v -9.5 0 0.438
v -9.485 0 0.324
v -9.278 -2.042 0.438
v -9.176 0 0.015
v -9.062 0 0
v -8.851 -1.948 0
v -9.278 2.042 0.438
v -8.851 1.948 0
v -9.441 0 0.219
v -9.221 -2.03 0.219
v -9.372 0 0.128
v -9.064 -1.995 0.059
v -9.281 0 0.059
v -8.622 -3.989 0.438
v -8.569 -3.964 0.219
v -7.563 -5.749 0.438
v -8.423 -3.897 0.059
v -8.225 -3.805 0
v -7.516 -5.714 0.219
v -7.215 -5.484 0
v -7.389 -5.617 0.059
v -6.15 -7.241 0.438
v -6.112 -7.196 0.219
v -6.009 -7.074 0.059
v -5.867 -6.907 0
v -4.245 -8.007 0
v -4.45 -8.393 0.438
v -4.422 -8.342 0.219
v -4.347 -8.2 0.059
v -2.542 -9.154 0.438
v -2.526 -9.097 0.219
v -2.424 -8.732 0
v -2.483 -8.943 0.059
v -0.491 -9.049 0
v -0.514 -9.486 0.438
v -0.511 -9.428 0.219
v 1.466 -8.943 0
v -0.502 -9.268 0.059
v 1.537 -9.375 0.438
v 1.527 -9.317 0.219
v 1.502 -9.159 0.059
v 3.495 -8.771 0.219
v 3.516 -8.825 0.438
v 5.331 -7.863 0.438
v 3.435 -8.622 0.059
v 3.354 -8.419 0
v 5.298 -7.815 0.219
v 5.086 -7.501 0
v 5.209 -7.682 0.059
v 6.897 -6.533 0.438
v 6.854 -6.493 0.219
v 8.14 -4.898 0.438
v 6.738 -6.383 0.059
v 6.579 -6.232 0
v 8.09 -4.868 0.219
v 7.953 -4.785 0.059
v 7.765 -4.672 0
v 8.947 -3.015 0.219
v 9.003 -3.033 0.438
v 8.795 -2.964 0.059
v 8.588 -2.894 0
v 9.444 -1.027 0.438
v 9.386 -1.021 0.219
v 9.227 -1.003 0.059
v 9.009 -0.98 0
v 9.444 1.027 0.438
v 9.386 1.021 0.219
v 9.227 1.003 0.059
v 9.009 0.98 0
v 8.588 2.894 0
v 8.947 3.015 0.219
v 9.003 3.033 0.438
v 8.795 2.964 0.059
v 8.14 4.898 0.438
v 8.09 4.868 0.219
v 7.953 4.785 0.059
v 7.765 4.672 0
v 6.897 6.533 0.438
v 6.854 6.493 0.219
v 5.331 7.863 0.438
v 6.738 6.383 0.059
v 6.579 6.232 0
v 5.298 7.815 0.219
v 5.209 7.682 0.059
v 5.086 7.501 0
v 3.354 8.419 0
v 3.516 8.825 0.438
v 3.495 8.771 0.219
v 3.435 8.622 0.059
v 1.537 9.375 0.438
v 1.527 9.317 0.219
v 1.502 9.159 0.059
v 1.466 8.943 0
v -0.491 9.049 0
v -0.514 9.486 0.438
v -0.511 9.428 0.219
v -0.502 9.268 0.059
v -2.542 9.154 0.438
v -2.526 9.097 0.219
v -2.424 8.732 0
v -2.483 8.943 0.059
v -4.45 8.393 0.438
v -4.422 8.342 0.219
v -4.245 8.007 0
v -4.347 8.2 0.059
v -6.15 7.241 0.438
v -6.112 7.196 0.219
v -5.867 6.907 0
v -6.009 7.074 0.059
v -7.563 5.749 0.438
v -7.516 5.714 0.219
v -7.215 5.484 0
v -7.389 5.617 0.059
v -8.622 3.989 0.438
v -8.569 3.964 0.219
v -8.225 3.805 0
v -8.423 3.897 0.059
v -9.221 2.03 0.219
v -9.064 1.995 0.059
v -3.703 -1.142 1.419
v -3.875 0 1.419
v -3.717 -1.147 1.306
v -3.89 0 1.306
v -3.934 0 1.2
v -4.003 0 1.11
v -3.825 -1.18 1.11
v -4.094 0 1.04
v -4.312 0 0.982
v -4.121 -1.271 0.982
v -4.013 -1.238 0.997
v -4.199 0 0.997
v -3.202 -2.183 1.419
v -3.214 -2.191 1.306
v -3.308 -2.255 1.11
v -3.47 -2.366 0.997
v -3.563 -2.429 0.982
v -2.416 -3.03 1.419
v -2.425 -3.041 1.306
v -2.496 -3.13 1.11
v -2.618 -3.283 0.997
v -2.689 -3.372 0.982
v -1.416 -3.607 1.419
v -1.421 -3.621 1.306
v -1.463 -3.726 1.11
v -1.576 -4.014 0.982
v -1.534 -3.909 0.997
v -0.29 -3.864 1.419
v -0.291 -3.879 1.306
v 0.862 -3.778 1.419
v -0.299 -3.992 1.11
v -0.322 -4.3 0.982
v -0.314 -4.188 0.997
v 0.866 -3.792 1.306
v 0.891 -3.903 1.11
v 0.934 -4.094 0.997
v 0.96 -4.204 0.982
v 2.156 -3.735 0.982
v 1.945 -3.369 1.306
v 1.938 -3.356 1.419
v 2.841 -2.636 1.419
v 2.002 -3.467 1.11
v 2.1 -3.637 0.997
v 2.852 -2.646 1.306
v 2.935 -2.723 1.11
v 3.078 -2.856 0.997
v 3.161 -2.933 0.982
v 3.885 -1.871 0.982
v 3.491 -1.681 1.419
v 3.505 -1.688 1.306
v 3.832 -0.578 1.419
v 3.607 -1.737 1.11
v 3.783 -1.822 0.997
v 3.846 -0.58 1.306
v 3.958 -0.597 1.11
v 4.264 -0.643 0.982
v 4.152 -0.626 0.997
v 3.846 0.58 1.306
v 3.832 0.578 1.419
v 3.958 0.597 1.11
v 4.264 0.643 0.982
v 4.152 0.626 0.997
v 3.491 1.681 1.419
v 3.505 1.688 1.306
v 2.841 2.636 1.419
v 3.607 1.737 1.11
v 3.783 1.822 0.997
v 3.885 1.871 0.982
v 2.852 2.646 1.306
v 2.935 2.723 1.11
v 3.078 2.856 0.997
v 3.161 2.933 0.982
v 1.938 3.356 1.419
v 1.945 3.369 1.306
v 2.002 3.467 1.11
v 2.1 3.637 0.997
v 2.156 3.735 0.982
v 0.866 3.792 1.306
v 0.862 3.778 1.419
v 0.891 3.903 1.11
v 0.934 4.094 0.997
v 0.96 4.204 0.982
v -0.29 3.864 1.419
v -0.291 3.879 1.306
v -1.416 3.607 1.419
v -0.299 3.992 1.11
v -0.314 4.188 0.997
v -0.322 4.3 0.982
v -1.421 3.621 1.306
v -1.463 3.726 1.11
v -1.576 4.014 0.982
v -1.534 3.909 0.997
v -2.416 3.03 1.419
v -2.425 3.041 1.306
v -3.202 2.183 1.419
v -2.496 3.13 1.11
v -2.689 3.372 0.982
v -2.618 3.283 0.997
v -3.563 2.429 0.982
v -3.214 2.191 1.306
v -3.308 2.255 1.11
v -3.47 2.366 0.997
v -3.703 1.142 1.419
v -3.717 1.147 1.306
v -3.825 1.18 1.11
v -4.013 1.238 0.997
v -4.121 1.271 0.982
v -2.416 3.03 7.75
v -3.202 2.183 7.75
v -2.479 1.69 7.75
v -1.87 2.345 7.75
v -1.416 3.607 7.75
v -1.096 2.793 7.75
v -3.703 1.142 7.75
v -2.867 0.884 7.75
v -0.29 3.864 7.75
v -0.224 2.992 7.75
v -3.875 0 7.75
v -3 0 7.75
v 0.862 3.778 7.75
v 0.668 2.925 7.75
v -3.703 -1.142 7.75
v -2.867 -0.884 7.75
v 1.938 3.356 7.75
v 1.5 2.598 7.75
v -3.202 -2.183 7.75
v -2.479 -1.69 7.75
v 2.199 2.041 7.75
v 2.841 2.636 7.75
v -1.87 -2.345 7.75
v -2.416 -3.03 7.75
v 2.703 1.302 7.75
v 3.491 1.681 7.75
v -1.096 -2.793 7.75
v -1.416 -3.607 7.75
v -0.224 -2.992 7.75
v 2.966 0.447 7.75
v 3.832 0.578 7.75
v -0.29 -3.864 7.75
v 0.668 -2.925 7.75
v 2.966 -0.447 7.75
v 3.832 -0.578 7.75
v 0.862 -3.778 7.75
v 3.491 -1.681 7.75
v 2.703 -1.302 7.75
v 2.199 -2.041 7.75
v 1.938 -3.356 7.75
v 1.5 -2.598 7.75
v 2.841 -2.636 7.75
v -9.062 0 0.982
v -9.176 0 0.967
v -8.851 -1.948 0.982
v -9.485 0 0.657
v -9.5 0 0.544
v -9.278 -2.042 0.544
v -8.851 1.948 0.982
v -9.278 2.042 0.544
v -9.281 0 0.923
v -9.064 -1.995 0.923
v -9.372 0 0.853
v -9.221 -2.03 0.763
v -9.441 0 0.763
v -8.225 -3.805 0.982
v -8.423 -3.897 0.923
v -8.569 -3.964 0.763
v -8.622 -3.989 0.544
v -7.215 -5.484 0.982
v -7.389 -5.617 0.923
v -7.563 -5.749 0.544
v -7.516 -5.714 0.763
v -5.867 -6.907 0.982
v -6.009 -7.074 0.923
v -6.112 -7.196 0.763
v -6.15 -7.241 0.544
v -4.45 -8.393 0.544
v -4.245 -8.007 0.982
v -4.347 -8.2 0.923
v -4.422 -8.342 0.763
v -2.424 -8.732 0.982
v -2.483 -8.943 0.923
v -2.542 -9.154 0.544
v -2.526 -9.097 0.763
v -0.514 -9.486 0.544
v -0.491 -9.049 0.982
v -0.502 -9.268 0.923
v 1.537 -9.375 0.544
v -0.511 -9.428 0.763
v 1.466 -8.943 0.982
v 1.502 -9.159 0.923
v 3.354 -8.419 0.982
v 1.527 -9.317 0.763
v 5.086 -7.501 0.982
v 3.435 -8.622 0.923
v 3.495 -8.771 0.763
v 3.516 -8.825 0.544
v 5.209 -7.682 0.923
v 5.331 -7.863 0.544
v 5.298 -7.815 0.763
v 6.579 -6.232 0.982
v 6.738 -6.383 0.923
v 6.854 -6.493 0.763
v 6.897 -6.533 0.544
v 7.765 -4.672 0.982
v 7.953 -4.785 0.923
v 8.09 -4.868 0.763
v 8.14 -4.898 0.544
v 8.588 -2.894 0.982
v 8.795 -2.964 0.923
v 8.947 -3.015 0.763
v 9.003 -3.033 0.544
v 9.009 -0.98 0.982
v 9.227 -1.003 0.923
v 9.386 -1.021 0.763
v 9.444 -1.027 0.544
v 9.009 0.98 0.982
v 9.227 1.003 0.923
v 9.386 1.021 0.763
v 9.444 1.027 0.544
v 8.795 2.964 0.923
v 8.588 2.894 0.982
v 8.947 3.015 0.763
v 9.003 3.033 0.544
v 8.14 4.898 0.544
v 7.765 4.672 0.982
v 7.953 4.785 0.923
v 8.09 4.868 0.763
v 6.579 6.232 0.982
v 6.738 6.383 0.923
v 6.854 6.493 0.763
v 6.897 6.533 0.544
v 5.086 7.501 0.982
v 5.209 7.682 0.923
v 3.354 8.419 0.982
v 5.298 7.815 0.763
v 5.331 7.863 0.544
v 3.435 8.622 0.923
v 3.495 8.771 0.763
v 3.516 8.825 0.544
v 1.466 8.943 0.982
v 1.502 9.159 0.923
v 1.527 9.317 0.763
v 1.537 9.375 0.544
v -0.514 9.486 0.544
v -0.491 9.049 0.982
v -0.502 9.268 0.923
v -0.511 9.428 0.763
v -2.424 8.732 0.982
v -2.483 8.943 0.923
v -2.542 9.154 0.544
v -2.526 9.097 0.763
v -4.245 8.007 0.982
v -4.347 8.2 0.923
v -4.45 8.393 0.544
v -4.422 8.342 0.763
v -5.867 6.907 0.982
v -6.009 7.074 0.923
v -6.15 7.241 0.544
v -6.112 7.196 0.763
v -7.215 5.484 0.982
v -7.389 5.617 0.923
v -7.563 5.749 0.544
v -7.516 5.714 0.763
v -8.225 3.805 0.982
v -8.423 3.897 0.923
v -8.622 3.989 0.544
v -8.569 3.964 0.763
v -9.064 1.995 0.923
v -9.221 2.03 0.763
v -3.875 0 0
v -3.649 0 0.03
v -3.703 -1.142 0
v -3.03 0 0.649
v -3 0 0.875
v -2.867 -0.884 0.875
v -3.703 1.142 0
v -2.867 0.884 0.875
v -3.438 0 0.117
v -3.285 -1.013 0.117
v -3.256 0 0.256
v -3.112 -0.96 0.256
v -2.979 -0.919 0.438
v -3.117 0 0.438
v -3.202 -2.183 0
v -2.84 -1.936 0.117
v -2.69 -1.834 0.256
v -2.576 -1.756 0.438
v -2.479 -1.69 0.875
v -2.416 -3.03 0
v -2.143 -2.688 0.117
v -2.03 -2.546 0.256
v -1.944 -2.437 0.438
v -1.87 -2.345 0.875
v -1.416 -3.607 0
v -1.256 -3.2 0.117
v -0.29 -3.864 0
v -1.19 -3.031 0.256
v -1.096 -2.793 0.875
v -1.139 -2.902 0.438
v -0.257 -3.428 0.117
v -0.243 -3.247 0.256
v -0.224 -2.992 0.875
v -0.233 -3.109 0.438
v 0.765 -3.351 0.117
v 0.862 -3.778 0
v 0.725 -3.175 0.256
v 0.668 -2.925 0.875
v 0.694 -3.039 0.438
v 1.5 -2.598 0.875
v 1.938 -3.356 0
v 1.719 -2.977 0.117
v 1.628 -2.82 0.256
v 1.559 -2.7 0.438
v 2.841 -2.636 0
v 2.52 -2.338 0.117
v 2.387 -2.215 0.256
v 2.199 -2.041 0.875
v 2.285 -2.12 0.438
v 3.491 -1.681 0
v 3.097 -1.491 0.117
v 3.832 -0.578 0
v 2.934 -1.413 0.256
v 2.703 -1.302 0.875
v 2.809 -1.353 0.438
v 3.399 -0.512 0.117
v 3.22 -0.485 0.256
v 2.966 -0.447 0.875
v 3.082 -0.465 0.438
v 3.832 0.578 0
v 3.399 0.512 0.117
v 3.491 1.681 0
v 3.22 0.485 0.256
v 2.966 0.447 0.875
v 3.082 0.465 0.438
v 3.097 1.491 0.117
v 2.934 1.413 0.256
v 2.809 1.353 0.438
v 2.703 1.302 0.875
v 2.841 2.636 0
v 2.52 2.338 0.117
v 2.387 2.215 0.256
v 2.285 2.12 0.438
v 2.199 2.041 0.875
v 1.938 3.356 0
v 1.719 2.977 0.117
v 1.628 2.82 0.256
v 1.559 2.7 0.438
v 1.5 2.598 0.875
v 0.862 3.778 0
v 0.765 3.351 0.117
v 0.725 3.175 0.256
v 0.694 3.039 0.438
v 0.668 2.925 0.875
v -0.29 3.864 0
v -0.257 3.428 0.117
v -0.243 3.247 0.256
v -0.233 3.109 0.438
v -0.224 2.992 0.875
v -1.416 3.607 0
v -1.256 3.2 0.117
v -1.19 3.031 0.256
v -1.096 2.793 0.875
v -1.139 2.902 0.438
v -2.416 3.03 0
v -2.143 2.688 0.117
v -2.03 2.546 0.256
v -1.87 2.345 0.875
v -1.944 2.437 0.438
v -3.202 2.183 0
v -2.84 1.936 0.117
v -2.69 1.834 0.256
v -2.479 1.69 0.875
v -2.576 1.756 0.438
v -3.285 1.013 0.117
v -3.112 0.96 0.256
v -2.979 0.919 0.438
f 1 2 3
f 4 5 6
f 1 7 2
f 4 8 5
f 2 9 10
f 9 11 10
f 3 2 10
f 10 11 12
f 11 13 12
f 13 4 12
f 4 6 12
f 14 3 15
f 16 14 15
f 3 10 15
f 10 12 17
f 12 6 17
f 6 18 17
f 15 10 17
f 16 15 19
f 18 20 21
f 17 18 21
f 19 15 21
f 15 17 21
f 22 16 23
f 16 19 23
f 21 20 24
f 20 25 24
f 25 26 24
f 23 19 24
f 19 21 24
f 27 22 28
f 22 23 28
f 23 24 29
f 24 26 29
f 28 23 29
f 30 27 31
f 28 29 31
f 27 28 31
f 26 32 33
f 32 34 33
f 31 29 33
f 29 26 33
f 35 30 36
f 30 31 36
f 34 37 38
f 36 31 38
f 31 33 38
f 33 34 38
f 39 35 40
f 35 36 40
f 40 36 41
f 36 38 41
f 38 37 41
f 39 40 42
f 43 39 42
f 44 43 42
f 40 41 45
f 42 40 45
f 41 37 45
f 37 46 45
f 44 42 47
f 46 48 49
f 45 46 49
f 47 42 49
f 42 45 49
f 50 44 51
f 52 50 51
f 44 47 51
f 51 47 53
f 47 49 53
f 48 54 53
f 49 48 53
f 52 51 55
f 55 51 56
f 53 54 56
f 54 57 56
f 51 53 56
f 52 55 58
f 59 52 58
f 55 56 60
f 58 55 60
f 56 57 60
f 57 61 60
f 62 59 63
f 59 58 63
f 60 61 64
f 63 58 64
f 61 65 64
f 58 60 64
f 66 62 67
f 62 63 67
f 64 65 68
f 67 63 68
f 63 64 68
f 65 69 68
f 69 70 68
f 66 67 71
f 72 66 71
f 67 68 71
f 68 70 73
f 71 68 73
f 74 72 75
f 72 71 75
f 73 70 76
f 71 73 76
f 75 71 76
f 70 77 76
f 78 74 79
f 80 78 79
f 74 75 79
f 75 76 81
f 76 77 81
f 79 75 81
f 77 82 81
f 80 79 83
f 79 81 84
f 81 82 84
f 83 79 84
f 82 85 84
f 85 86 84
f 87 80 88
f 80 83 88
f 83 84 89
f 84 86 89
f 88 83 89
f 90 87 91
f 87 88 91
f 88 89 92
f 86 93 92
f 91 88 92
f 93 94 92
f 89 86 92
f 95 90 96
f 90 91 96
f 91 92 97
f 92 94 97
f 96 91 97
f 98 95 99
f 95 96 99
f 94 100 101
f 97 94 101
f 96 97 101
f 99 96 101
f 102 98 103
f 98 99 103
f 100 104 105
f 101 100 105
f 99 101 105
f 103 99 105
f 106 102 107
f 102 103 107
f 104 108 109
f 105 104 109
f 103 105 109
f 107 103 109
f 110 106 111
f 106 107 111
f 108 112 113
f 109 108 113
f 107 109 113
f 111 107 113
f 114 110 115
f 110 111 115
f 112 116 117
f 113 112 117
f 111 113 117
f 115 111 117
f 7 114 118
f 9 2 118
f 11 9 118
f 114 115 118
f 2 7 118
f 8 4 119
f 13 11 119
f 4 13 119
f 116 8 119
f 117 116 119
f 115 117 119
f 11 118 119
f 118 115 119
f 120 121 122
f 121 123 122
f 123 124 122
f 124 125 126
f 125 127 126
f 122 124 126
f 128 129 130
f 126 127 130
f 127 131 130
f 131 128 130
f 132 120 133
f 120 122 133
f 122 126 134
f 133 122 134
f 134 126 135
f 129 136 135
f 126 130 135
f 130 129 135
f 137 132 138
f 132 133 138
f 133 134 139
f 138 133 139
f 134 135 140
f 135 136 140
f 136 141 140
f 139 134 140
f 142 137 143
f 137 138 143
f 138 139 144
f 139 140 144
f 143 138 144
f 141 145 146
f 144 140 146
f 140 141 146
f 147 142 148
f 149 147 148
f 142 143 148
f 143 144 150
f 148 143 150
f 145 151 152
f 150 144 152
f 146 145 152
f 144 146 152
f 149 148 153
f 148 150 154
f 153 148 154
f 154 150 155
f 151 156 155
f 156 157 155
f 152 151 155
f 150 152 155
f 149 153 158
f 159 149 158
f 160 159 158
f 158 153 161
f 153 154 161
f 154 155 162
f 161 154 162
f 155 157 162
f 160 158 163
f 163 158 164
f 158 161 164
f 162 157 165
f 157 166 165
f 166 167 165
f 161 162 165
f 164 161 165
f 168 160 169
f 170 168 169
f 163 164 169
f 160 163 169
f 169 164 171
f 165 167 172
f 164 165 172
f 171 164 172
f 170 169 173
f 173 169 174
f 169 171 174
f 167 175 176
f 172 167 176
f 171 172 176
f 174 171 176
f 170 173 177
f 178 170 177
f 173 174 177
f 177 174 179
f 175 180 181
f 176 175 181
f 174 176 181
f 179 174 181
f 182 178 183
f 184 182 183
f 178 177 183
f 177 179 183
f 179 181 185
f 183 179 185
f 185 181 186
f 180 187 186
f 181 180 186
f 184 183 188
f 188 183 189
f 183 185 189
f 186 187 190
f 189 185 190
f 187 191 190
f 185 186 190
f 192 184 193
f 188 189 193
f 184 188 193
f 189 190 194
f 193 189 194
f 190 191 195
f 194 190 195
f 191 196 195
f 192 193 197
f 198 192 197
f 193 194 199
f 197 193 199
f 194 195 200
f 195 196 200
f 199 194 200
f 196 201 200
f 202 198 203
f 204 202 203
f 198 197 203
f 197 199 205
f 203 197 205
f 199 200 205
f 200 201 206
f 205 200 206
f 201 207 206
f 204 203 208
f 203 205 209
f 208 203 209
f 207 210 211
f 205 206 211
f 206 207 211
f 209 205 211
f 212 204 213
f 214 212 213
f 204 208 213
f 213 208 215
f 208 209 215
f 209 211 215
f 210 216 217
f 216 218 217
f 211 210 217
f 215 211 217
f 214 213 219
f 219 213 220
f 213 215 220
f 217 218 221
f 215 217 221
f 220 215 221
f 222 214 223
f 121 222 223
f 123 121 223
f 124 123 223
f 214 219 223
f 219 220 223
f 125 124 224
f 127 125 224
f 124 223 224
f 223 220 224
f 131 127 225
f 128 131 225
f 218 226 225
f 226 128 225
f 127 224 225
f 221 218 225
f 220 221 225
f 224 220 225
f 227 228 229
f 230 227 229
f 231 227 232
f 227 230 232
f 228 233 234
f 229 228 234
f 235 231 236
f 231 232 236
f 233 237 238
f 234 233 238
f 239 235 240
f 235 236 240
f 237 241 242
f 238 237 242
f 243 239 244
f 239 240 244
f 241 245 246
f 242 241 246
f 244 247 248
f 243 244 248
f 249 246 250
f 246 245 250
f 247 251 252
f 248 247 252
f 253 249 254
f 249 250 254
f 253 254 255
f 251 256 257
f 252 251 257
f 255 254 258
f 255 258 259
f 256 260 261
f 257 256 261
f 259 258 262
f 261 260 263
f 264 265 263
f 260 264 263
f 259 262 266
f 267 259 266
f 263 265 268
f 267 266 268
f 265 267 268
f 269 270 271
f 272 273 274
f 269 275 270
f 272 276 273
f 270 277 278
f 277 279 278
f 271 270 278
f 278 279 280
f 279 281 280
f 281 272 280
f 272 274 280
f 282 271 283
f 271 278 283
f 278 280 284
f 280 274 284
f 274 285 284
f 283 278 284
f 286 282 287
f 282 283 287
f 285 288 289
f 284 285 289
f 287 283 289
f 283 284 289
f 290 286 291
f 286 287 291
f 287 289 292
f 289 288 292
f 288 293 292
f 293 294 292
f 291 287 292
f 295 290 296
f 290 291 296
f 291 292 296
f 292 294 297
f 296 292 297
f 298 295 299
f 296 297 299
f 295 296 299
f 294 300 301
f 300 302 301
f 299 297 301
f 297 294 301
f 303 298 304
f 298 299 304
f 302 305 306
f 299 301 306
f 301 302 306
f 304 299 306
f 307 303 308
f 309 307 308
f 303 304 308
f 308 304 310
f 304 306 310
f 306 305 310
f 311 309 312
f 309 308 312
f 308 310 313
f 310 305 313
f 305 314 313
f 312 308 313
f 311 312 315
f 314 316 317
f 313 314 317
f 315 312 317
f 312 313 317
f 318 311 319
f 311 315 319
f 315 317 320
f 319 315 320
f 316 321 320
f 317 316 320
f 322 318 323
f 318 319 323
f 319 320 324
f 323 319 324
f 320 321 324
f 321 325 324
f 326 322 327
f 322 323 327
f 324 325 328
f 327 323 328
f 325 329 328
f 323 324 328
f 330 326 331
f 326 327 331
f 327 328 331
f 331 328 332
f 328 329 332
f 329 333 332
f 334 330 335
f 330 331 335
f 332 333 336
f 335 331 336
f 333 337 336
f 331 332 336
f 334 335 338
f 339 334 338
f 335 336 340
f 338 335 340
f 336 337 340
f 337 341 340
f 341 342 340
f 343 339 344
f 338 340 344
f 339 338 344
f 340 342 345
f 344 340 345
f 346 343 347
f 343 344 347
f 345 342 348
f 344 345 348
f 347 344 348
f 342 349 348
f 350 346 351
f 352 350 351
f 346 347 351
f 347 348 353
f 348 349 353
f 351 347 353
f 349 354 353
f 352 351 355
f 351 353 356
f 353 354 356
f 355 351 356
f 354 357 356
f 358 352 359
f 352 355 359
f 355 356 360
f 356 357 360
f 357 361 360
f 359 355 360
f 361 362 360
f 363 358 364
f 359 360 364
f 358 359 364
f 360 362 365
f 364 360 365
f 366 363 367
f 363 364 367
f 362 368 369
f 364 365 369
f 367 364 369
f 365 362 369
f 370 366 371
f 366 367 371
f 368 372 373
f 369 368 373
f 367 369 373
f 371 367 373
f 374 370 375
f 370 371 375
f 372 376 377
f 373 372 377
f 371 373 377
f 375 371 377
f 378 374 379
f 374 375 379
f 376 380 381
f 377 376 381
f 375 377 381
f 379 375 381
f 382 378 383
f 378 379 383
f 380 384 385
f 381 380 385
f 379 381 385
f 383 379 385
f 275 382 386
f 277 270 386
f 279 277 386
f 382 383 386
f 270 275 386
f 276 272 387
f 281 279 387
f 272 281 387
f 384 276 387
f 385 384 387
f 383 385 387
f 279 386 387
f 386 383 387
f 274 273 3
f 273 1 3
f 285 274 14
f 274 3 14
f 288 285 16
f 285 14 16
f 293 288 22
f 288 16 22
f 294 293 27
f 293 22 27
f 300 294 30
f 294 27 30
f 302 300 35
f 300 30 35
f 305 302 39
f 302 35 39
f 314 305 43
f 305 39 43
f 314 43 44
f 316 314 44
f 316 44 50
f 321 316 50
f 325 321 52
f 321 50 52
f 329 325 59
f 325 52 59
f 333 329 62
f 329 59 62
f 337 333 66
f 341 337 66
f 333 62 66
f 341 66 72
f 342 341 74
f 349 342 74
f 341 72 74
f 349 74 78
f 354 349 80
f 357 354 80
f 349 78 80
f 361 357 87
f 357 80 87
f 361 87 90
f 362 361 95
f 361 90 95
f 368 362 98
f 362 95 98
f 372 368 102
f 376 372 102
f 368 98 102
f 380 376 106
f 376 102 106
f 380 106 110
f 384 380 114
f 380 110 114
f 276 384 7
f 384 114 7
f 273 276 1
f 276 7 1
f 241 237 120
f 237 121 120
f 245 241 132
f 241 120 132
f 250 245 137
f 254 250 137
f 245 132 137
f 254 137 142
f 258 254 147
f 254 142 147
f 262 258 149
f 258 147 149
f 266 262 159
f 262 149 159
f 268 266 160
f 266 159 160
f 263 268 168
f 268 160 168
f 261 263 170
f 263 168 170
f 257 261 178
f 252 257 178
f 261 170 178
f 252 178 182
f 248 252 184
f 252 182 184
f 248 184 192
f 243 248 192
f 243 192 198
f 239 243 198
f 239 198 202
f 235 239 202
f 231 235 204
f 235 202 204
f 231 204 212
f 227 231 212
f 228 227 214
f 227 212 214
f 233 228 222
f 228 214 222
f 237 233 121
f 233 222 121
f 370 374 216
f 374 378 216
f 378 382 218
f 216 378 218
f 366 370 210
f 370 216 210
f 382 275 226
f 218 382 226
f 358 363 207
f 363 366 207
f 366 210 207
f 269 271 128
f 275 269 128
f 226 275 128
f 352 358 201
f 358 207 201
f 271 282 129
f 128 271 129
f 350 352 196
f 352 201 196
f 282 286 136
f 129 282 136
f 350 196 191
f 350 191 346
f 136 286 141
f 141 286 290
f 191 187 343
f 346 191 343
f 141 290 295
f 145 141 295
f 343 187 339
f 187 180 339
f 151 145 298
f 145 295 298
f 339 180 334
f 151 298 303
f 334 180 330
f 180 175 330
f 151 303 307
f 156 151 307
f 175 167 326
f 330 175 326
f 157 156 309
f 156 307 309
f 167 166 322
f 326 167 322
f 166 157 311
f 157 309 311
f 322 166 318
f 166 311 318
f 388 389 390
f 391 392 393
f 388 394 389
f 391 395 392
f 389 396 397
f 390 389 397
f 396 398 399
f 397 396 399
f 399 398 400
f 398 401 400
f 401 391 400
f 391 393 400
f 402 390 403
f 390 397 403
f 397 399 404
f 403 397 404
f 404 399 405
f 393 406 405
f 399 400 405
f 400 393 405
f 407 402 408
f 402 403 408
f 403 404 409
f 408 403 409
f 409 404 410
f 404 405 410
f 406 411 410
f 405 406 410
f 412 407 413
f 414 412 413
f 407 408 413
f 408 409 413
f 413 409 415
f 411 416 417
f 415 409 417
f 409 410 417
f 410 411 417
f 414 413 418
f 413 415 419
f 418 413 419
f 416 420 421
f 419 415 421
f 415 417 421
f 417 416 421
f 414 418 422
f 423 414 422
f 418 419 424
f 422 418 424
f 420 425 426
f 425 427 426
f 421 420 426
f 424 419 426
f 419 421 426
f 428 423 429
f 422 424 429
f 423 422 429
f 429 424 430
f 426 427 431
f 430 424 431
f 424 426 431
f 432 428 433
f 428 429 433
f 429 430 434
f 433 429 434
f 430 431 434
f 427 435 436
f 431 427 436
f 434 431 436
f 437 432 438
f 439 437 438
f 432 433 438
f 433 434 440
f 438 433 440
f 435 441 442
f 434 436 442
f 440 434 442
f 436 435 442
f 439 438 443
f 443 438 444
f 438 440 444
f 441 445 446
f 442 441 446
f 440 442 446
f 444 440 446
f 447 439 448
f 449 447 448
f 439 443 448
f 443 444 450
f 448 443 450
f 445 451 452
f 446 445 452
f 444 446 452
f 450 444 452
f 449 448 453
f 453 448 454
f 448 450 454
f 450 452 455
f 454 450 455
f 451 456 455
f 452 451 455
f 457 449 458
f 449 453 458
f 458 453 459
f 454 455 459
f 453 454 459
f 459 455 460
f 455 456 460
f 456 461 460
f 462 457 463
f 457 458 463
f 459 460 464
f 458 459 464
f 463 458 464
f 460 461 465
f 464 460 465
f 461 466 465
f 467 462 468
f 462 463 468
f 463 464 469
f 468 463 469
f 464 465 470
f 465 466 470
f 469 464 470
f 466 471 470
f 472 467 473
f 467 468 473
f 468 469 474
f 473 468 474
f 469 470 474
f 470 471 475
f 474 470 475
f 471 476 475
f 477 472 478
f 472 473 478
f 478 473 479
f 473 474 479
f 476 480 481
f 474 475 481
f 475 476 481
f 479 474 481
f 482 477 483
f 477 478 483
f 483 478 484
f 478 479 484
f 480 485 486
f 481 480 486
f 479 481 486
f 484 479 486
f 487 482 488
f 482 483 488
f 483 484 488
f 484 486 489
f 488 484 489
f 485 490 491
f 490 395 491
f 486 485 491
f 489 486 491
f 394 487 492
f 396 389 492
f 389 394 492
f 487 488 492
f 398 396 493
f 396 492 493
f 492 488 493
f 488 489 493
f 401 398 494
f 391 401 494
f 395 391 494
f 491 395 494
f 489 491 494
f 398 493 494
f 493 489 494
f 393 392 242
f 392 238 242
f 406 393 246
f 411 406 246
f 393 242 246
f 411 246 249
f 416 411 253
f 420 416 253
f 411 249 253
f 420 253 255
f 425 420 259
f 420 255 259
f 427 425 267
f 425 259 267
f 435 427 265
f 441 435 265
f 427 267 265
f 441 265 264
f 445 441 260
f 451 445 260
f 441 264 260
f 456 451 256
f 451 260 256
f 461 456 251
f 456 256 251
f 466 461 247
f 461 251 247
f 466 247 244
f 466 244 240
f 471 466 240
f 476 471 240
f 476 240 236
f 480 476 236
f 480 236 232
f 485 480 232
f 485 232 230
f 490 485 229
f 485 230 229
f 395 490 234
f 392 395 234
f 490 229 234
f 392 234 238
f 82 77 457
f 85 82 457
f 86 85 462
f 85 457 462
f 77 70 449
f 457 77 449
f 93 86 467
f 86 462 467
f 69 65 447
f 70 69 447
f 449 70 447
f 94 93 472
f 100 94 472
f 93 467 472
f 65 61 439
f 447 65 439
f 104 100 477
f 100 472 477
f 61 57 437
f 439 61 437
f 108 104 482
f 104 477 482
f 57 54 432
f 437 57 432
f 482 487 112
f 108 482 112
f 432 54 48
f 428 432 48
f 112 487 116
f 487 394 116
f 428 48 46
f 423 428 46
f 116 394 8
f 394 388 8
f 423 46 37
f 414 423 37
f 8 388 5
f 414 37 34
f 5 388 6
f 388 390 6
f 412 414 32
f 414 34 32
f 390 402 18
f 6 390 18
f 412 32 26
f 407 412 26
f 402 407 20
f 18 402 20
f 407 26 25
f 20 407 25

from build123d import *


with BuildPart() as f1:
    # F0 (on Front) → F1 (revolve)
    with BuildSketch(Plane.XZ):
        with BuildLine():
            Line((-9.0625, 0), (-3.875, 0))
            ThreePointArc((-3.875, 0), (-3.256282, 0.256282), (-3, 0.875))
            Line((-3, 0.875), (-3, 7.75))
            Line((-3, 7.75), (-3.875, 7.75))
            Line((-3.875, 7.75), (-3.875, 1.419101))
            ThreePointArc((-3.875, 1.419101), (-4.003141, 1.109741), (-4.3125, 0.981601))
            Line((-4.3125, 0.981601), (-9.0625, 0.981601))
            ThreePointArc((-9.0625, 0.981601), (-9.371859, 0.85346), (-9.5, 0.544101))
            Line((-9.5, 0.544101), (-9.5, 0.4375))
            ThreePointArc((-9.5, 0.4375), (-9.371859, 0.128141), (-9.0625, 0))
        make_face()
    revolve(axis=Axis((0, 0, 3.875), (0, 0, 1)))


solid = f1.part
